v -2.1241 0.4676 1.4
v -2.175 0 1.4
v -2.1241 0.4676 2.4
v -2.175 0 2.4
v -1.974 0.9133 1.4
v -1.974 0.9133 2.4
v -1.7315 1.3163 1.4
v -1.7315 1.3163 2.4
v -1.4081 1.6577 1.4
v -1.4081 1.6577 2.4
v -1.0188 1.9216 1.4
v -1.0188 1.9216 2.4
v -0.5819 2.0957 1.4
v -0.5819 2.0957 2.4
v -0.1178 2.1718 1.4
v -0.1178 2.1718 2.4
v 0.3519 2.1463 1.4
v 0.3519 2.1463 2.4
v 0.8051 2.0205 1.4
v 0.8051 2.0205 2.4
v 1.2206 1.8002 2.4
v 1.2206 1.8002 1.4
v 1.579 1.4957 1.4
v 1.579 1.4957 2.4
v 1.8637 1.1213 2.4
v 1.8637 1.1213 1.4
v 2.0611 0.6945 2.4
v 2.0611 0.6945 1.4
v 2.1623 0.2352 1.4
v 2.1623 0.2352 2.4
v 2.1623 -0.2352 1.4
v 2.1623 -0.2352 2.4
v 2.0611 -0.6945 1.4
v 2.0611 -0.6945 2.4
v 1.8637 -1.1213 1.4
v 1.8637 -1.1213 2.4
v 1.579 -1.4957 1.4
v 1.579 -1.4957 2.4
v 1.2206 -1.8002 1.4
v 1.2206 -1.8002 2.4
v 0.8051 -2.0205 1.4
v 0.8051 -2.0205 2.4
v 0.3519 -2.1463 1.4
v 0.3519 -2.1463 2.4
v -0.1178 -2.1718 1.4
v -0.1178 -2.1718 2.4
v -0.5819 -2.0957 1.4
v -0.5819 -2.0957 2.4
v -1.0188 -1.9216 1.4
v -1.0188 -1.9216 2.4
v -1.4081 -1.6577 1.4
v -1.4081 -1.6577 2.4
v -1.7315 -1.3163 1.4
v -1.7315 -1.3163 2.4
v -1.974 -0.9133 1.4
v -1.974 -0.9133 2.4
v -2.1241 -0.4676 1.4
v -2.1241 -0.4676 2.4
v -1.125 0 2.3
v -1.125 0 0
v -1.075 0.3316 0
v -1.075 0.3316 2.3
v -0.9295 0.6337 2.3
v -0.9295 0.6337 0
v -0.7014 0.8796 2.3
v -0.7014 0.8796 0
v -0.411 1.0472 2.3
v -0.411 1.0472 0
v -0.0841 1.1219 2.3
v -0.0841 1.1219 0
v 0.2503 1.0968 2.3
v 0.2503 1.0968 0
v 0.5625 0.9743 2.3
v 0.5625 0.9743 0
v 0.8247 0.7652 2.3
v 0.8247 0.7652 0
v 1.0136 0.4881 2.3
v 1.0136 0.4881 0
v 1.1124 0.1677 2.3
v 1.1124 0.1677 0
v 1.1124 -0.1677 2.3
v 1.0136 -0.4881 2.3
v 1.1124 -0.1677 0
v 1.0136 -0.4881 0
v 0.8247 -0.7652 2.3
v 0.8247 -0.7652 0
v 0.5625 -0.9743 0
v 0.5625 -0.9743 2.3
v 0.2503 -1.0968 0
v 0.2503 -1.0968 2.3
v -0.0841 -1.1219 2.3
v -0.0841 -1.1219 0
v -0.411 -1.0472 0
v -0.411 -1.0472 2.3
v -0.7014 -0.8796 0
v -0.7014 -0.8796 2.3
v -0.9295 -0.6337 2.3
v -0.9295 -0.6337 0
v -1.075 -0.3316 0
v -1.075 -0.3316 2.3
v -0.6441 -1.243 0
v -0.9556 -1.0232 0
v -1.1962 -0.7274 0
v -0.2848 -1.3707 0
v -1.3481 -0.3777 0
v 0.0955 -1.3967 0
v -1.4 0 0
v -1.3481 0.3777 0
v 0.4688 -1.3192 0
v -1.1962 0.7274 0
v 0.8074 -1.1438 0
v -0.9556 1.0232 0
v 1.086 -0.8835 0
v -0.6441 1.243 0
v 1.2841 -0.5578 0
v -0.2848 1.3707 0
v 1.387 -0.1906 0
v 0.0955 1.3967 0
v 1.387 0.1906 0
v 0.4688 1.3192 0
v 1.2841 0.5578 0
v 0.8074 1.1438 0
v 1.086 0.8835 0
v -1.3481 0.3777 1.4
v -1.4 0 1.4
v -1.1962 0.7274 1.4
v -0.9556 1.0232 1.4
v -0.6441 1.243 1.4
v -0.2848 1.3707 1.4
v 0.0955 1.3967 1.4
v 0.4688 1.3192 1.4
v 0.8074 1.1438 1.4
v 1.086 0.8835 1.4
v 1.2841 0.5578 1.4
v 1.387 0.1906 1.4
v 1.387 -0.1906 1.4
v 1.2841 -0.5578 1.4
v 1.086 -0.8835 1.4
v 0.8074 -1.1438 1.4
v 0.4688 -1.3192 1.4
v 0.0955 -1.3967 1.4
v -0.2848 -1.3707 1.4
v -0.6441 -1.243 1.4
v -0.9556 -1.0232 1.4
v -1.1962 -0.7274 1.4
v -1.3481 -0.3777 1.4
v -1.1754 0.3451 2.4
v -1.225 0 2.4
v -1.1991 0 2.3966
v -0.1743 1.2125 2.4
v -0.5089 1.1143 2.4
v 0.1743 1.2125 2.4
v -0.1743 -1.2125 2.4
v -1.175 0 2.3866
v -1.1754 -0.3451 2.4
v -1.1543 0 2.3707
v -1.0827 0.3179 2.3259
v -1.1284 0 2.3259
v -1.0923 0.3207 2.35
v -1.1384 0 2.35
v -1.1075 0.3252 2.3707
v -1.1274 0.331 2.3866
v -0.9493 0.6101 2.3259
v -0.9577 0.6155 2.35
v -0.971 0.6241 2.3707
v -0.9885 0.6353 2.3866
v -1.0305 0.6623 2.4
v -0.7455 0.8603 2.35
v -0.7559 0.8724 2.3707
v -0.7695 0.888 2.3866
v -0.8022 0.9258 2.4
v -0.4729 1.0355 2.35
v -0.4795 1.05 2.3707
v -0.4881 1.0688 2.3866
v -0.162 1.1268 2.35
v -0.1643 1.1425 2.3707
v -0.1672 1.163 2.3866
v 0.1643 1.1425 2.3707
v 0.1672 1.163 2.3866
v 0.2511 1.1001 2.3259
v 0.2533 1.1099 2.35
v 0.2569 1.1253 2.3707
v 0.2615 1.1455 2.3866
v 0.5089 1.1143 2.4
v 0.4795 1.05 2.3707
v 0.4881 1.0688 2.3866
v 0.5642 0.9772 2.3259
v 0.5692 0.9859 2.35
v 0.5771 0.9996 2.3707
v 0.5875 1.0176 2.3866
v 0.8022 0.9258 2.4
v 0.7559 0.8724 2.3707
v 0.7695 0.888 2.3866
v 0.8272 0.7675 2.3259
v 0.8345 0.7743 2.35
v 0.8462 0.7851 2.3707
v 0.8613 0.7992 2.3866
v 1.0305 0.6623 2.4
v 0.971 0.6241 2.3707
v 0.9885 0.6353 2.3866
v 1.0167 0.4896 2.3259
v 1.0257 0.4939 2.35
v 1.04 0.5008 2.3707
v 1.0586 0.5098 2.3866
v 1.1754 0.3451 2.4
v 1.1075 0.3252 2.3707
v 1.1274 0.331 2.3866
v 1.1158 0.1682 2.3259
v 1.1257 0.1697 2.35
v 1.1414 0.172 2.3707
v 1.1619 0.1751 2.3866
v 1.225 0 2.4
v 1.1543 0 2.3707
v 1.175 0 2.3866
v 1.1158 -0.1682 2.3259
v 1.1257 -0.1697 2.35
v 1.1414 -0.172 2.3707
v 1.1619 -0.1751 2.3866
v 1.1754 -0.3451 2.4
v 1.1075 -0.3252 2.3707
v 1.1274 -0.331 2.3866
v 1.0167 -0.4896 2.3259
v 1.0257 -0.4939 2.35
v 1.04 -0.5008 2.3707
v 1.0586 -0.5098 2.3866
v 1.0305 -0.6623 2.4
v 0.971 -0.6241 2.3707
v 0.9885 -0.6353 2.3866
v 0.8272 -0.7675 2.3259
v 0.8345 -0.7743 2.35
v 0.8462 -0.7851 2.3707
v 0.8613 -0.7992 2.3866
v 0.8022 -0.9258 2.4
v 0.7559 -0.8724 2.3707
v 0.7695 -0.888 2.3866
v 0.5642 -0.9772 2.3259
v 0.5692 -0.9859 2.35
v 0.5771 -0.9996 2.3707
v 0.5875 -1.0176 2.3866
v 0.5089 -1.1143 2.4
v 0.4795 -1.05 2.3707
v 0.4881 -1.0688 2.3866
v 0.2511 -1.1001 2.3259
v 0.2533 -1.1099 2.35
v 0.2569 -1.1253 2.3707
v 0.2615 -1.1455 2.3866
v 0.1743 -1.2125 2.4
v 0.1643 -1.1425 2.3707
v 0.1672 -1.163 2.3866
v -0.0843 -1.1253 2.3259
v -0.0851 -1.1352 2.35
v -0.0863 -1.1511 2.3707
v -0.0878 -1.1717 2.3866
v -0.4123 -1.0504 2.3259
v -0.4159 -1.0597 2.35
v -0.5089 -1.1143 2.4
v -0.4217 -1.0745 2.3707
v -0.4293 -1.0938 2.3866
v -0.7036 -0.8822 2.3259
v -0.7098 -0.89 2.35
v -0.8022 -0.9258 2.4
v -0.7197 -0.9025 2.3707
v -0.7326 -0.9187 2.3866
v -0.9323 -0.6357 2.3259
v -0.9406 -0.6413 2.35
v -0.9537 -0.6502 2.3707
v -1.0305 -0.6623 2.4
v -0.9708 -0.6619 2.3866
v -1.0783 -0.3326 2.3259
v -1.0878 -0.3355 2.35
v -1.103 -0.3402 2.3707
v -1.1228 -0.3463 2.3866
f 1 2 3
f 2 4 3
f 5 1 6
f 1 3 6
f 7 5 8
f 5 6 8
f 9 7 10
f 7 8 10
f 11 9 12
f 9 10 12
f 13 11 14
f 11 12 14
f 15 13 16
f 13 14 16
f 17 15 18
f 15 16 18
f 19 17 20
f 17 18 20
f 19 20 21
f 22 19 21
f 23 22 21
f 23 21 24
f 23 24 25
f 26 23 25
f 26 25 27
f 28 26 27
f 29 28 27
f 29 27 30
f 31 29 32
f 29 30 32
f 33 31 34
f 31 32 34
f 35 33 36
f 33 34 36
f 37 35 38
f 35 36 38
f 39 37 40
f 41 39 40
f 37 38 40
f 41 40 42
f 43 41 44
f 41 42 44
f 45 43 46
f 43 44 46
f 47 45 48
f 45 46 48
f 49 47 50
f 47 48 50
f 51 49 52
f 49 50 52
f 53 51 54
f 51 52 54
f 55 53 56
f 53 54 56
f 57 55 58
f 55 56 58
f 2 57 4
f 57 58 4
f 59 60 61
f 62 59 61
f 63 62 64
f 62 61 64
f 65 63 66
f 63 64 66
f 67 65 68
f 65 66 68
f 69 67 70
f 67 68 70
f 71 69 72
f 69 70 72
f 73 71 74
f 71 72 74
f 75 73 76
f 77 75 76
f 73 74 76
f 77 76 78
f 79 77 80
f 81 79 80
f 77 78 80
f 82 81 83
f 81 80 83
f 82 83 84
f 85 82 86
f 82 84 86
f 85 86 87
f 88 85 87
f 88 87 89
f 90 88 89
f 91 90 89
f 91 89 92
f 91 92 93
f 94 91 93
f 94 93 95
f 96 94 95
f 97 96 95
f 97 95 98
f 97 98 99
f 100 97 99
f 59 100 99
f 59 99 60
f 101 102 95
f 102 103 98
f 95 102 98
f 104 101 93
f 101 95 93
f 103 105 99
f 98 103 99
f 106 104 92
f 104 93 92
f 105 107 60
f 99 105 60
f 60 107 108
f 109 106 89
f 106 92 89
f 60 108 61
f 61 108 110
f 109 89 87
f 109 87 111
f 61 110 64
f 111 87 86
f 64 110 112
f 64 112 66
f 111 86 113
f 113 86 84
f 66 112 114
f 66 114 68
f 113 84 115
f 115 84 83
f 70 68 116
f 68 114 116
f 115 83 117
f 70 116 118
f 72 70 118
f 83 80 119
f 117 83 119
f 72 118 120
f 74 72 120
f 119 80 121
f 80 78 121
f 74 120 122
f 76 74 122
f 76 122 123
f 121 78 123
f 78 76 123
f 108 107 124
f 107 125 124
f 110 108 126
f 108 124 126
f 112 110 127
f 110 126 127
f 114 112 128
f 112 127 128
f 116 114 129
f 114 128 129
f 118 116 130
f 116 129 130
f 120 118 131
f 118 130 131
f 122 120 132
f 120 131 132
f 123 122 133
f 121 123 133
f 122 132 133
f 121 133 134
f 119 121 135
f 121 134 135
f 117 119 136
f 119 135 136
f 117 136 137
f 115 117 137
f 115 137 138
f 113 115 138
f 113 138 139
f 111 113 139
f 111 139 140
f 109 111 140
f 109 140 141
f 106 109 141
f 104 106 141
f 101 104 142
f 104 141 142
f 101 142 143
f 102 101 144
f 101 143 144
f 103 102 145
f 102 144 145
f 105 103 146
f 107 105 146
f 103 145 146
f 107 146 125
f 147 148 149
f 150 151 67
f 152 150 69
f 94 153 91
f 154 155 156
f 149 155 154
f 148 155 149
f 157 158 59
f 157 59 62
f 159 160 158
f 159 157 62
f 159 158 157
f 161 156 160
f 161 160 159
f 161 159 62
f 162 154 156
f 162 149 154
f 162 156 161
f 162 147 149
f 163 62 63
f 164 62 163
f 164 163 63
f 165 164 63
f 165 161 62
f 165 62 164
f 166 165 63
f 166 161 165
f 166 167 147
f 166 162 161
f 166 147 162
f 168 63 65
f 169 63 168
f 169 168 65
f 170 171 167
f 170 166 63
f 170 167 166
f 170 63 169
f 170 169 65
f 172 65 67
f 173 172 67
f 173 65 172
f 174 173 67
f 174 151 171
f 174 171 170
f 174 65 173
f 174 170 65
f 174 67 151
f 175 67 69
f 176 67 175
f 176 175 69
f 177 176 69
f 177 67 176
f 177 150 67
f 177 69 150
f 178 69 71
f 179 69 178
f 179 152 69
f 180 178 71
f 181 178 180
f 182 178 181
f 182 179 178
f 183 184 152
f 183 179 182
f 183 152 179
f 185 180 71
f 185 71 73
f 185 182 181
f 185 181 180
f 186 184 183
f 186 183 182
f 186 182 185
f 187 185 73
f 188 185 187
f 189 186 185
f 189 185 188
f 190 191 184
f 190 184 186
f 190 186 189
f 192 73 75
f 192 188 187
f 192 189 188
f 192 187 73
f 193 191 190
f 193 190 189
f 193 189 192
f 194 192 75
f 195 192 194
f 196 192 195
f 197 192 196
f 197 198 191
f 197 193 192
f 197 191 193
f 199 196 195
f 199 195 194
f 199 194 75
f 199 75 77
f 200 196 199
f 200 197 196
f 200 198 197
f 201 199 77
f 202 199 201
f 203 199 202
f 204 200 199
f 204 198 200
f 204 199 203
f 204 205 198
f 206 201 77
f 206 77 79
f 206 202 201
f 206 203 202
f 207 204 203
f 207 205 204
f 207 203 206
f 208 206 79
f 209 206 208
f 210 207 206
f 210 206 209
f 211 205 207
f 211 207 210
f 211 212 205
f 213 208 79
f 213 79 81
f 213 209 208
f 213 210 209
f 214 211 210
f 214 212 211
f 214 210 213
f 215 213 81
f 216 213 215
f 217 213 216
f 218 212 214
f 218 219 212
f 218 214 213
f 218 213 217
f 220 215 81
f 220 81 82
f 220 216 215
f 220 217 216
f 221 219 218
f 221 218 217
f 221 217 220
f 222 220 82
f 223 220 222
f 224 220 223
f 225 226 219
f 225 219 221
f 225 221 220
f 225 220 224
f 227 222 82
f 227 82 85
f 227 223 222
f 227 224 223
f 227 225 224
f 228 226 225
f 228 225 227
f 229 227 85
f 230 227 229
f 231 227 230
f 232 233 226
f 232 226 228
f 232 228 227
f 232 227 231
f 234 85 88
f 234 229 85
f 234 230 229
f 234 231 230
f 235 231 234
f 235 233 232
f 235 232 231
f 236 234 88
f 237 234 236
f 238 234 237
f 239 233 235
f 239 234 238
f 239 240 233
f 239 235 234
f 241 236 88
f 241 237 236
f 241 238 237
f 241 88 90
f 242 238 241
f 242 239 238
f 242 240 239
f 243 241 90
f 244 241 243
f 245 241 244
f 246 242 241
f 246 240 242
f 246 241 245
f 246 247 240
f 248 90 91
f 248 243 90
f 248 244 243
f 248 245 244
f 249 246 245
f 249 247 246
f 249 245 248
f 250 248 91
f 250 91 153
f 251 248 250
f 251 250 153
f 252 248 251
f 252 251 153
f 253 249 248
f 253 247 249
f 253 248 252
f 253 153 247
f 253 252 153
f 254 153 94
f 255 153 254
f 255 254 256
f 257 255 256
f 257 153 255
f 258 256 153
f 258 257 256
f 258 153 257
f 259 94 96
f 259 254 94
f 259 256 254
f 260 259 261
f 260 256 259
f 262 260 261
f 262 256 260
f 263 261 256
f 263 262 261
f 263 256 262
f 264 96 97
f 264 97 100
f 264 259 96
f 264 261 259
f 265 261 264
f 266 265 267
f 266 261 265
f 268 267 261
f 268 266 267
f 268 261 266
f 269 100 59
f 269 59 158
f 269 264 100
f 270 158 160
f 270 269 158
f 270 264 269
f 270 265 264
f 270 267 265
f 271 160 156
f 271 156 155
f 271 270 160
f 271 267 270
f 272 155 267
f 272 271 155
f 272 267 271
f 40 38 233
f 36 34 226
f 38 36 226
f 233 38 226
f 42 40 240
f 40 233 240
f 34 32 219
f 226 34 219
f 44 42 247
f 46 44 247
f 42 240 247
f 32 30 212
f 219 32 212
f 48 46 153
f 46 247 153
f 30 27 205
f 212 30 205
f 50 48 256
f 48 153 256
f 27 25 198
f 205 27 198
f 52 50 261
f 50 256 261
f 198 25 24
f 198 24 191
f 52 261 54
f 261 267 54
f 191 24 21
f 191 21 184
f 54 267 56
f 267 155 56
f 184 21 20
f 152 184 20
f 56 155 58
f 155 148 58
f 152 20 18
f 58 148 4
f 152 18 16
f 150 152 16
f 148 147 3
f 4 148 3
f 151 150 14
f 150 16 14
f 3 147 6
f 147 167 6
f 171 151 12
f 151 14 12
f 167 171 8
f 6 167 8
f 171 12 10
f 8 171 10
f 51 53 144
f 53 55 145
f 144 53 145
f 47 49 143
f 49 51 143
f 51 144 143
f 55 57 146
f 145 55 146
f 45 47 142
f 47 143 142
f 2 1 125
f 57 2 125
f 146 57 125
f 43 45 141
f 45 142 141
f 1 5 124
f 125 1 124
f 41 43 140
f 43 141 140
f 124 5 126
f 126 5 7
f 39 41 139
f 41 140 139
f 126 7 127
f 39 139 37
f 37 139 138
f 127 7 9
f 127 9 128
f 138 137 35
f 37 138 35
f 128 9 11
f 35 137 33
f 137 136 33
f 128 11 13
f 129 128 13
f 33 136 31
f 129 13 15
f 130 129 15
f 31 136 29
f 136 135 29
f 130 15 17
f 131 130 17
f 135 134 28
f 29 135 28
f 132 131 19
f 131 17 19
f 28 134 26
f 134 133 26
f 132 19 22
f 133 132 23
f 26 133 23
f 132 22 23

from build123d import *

# Parameters (mm, degrees)
HOLEWZD1_D = 2.25
FILLET1_R  = 0.1


with BuildPart() as part:
    # Sketch1 → Revolve1 (revolve)
    with BuildSketch(Plane.XZ, mode=Mode.PRIVATE) as revolve1_sk:
        Polygon((0, 0), (1.4, 0), (1.4, 1.4), (2.175, 1.4), (2.175, 2.4), (0, 2.4), align=None)
    revolve(revolve1_sk.sketch.rotate(Axis((0, 0, 2.4), (0, 0, -1)), 180), axis=Axis((0, 0, 2.4), (0, 0, -1)))

    # HoleWzd1 (through all)
    with Locations(Plane.XY.offset(2.4)):
        with Locations((0, 0)):
            Hole(HOLEWZD1_D / 2)

    # Fillet1
    fillet1_edges = [part.edges().sort_by_distance(p)[0] for p in [
        (1.125, 0, 2.4),
    ]]
    fillet(fillet1_edges, radius=FILLET1_R)


solid = part.part
